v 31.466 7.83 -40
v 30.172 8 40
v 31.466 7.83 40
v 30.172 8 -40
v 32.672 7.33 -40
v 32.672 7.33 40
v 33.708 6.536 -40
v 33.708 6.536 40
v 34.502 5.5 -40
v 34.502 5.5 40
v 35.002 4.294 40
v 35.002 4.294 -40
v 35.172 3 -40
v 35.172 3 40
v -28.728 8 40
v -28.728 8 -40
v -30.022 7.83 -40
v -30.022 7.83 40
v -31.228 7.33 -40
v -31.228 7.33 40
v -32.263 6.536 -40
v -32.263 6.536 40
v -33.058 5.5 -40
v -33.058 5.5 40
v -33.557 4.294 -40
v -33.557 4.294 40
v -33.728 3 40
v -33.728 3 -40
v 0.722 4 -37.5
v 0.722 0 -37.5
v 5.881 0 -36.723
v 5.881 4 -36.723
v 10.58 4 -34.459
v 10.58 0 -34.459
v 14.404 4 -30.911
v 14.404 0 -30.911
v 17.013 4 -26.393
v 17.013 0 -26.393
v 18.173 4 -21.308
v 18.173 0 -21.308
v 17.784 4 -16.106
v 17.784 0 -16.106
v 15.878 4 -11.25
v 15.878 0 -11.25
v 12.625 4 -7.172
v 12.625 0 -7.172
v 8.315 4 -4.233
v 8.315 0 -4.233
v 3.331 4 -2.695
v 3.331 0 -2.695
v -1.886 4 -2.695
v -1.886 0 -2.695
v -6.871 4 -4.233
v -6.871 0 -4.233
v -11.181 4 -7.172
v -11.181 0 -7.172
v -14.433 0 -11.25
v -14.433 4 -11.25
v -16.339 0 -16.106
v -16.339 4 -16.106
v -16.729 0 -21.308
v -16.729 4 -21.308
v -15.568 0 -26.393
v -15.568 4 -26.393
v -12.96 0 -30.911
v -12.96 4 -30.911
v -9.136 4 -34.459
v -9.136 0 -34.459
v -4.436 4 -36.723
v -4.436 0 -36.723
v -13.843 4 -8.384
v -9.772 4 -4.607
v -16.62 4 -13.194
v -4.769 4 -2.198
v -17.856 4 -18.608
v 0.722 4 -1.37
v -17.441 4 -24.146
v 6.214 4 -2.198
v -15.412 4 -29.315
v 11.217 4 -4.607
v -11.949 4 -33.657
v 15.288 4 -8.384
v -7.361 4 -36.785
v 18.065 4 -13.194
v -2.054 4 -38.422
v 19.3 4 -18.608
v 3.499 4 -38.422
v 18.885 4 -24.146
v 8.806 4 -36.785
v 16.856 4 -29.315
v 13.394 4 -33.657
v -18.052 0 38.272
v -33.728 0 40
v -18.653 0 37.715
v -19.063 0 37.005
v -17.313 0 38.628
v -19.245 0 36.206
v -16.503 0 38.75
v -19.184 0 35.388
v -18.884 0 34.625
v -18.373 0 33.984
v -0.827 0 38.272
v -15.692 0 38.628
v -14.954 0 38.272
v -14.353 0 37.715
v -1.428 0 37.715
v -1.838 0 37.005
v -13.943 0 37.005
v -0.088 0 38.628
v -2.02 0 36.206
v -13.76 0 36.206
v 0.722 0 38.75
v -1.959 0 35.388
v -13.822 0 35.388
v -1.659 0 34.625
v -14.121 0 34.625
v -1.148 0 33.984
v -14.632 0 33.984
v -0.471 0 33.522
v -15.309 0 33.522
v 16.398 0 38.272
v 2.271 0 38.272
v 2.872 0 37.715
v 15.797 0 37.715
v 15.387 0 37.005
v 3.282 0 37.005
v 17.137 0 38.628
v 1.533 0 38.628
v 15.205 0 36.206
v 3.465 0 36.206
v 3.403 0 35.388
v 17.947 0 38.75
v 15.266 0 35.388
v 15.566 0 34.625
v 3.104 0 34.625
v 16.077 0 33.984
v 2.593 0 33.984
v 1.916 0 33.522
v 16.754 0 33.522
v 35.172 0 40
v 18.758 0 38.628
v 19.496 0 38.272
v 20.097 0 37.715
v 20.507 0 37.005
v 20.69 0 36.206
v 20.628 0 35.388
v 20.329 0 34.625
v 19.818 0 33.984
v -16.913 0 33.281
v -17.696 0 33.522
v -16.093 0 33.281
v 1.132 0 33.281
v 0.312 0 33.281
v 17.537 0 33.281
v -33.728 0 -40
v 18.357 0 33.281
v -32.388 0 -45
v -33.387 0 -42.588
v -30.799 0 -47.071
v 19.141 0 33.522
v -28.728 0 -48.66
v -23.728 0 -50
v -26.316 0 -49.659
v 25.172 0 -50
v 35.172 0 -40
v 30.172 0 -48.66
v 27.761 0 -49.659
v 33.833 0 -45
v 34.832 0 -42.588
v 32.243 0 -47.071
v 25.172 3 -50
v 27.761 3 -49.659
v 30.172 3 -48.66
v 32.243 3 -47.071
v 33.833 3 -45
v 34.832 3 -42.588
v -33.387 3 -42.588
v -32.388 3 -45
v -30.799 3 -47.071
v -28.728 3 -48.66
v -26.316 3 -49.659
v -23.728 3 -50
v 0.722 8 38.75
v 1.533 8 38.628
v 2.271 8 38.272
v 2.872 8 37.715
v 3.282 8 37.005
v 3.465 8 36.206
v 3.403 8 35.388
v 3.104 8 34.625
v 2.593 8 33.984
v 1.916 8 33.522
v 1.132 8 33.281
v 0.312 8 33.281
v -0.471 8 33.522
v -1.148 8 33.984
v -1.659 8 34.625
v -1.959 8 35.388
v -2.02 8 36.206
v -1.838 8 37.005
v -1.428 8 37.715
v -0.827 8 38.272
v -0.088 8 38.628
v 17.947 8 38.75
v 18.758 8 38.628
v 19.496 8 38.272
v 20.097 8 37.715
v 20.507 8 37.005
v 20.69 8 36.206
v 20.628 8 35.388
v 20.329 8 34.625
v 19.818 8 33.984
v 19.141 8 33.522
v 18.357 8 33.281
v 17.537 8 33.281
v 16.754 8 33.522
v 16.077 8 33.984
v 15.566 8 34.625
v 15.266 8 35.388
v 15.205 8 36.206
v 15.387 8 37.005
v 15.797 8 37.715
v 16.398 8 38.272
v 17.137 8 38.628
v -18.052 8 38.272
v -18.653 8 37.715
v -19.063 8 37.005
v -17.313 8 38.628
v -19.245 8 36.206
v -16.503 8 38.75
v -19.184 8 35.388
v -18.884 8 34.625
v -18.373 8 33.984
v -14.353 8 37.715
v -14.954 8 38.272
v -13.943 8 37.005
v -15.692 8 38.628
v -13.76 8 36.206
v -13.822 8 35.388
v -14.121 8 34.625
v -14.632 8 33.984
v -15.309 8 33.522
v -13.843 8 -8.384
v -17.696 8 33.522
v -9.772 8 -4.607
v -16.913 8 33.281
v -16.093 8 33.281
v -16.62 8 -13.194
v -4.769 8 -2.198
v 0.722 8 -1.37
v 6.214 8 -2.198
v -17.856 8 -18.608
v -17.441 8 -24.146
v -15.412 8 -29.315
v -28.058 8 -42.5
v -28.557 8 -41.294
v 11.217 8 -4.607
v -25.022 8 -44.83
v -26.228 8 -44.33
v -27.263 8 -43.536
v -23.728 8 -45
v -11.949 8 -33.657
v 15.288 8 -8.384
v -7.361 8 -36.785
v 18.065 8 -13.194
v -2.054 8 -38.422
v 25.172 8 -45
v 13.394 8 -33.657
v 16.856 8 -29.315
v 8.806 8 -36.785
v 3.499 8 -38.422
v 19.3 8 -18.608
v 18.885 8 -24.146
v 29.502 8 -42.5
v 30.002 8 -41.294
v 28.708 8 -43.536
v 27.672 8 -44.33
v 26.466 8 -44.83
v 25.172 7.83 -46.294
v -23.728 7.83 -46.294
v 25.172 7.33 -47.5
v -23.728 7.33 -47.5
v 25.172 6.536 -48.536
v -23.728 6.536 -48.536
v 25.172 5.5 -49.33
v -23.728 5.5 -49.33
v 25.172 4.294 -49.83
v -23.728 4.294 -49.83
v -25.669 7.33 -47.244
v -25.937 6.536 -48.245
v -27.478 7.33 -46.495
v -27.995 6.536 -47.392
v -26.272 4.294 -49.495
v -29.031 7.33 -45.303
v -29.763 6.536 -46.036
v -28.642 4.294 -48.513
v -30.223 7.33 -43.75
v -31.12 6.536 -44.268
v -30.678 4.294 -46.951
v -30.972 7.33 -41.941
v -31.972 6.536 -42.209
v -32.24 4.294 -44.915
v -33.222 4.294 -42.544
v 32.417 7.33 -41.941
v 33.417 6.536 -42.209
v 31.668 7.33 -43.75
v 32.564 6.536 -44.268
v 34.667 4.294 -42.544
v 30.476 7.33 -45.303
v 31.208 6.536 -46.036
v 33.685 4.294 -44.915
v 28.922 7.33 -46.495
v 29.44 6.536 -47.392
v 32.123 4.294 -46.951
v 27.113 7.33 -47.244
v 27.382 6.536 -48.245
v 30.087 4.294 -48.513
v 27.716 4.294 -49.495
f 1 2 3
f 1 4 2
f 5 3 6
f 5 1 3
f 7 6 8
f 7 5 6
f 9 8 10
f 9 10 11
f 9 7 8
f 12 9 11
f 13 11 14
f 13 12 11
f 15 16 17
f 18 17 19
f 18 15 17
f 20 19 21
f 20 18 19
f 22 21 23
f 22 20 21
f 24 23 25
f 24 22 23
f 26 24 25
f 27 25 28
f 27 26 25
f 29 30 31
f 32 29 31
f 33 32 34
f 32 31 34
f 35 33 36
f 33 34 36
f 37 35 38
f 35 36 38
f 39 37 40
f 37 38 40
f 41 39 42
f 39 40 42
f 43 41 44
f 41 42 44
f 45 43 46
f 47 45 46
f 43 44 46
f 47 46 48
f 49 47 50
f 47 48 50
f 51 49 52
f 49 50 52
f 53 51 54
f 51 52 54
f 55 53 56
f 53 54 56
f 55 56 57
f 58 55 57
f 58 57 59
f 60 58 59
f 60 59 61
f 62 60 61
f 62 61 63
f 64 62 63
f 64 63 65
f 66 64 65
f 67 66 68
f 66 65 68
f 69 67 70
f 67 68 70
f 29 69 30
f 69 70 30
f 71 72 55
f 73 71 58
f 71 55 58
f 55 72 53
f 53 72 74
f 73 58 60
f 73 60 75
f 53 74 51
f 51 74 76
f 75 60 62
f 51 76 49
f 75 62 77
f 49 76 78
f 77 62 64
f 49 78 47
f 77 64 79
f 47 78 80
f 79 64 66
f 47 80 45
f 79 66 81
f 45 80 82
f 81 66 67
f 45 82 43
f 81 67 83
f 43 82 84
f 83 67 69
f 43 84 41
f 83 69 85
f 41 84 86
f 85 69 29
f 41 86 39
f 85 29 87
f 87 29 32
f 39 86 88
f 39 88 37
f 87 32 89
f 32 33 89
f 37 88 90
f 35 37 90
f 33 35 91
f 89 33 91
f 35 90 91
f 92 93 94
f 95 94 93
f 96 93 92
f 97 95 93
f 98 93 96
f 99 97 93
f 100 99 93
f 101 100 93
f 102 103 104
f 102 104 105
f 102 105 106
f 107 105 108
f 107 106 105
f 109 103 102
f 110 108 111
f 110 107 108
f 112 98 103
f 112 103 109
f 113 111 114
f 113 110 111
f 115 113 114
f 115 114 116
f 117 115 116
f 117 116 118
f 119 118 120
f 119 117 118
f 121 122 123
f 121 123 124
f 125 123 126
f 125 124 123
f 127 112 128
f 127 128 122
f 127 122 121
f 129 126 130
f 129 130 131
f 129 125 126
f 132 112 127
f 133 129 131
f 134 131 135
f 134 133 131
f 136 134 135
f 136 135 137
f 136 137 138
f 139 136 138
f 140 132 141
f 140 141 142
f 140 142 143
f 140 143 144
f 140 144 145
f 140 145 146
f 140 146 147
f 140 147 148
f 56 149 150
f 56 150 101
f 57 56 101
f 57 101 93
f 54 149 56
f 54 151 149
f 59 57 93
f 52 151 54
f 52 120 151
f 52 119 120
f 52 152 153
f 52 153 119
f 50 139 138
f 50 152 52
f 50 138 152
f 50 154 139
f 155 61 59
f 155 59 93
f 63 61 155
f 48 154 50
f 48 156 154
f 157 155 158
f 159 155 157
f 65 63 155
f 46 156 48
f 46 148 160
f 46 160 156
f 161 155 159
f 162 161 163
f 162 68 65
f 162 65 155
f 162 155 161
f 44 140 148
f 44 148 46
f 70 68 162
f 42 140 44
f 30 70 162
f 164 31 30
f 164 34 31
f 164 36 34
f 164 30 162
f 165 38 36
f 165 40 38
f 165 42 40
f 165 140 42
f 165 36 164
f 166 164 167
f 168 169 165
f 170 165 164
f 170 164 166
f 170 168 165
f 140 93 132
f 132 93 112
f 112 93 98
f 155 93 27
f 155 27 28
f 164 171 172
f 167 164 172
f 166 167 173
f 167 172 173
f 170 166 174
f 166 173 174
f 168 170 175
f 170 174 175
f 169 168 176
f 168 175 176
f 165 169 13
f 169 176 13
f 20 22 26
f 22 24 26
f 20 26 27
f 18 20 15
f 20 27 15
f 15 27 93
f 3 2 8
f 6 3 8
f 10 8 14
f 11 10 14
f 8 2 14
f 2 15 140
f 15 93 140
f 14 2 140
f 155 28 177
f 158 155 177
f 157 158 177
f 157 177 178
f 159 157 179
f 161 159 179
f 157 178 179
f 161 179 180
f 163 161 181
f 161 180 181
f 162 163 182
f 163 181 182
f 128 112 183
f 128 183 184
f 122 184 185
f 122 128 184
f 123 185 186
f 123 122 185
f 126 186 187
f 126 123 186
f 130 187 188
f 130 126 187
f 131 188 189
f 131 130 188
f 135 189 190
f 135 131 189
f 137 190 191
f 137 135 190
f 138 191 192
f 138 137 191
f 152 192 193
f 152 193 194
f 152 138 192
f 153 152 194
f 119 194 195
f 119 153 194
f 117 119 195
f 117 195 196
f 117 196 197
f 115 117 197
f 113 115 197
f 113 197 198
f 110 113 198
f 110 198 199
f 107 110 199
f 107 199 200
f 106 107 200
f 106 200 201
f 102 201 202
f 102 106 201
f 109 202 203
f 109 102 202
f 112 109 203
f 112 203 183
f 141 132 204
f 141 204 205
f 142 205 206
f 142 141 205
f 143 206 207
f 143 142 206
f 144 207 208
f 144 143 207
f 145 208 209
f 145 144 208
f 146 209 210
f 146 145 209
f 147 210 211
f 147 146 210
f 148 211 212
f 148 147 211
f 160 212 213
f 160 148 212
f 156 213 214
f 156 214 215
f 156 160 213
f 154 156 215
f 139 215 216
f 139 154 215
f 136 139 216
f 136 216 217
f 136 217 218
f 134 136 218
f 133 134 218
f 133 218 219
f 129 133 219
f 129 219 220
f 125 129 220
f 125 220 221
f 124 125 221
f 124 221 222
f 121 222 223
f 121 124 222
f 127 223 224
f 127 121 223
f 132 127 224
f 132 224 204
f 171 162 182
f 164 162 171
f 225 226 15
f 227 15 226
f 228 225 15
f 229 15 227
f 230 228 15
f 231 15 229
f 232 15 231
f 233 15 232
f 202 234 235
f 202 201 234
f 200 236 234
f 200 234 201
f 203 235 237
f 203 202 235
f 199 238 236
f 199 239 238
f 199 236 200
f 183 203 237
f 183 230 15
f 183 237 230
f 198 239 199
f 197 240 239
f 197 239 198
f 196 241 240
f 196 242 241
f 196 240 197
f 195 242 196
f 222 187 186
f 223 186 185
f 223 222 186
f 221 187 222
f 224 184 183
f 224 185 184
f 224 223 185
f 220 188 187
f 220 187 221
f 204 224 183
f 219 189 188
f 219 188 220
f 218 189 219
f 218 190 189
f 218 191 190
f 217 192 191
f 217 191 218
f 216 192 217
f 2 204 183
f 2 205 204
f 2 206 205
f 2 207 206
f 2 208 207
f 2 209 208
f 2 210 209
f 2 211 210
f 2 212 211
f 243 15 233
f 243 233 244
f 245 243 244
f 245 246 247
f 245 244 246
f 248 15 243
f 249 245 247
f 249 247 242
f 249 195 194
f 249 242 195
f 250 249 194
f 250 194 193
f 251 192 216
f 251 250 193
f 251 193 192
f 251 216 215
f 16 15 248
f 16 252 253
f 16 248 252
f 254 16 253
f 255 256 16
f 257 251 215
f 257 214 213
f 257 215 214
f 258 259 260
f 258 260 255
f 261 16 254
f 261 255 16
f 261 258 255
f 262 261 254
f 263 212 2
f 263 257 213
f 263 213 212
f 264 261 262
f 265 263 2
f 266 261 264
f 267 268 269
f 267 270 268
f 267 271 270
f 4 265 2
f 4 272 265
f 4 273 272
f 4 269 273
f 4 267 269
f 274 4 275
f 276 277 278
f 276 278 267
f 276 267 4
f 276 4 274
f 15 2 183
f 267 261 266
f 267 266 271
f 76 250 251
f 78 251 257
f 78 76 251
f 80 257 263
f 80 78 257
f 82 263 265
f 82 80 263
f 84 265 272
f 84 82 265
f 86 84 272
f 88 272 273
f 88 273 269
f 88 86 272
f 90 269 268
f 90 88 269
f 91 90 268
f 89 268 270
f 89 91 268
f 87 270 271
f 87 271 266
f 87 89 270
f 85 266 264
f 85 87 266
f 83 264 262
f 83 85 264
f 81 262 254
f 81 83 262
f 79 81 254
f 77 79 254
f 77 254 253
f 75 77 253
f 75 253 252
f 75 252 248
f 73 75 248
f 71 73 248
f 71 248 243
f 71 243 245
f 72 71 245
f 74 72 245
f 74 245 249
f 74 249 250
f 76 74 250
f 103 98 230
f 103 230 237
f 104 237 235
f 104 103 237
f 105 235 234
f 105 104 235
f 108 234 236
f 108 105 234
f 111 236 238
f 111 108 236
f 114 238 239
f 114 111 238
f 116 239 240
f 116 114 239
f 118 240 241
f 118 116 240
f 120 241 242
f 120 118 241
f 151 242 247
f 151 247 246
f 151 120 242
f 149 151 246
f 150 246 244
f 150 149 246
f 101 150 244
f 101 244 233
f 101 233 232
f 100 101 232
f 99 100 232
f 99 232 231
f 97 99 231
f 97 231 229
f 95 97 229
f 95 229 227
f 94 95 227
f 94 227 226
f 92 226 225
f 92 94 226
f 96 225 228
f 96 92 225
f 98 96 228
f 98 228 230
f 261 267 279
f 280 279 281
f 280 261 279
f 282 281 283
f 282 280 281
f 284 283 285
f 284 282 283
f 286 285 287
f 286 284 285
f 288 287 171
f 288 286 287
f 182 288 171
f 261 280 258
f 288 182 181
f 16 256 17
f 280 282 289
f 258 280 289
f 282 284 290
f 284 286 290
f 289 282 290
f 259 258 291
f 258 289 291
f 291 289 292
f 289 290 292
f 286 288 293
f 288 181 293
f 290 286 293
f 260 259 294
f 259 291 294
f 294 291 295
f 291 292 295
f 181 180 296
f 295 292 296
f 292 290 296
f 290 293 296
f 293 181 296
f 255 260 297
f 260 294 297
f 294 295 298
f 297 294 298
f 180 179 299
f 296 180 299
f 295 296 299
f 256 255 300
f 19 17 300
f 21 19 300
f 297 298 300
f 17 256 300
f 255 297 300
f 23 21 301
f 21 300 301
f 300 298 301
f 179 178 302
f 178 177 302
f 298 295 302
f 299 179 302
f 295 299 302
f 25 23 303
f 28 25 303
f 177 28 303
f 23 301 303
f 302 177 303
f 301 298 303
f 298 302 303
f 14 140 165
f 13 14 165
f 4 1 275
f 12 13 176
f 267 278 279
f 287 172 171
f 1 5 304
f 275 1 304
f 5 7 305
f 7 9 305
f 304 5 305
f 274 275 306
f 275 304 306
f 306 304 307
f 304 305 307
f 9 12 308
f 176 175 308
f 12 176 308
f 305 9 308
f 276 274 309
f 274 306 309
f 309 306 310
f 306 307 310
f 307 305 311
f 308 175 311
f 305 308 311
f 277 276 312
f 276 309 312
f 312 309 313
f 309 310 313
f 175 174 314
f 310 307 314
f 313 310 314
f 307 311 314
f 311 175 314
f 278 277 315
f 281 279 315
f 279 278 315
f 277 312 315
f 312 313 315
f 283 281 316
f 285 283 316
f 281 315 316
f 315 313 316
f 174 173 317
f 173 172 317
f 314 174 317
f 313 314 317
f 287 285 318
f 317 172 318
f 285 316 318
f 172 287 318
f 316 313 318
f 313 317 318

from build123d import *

# Parameters (mm, degrees)
SKETCH1_W           = 68.9
SKETCH1_H           = 90
SKETCH1_R           = 18.63
SKETCH1_R_2         = 2.75
BOSS_EXTRUDE1_DEPTH = 8
FILLET1_R           = 10
FILLET2_R           = 5
SKETCH2_R           = 18.63
SKETCH2_R_2         = 17.5
BOSS_EXTRUDE2_DEPTH = 4


with BuildPart() as part:
    # Sketch1 → Boss-Extrude1 (new body)
    with BuildSketch(Plane(origin=(0, 0, 0), x_dir=(1, 0, 0), z_dir=(0, 1, 0))):
        with Locations((0.722348924, 5)):
            Rectangle(SKETCH1_W, SKETCH1_H)
        with Locations(Location((0.722348924, 20, 0), (0, 0, 270))):
            Circle(SKETCH1_R, mode=Mode.SUBTRACT)
        with Locations(Location((0.722348924, -36, 0), (0, 0, 270))):
            Circle(SKETCH1_R_2, mode=Mode.SUBTRACT)
        with Locations(Location((-16.502651076, -36, 0), (0, 0, 270))):
            Circle(SKETCH1_R_2, mode=Mode.SUBTRACT)
        with Locations(Location((17.947348924, -36, 0), (0, 0, 270))):
            Circle(SKETCH1_R_2, mode=Mode.SUBTRACT)
    extrude(amount=BOSS_EXTRUDE1_DEPTH)

    # Fillet1
    fillet1_edges = [part.edges().sort_by_distance(p)[0] for p in [
        (-33.727651076, 4, -50),
        (35.172348924, 4, -50),
    ]]
    fillet(fillet1_edges, radius=FILLET1_R)

    # Fillet2
    fillet2_edges = [part.edges().sort_by_distance(p)[0] for p in [
        (35.172348924, 8, 0),
        (0.722348924, 8, -50),
        (-33.727651076, 8, 0),
        (-30.798718888, 8, -47.071067812),
        (32.243416735, 8, -47.071067812),
    ]]
    fillet(fillet2_edges, radius=FILLET2_R)

    # Sketch2 → Boss-Extrude2 (add)
    with BuildSketch(Plane.XZ):
        with Locations(Location((0.722348924, -20, 0), (0, 0, 270))):
            Circle(SKETCH2_R)
        with Locations(Location((0.722348924, -20, 0), (0, 0, 270))):
            Circle(SKETCH2_R_2, mode=Mode.SUBTRACT)
    extrude(amount=-BOSS_EXTRUDE2_DEPTH)


solid = part.part
